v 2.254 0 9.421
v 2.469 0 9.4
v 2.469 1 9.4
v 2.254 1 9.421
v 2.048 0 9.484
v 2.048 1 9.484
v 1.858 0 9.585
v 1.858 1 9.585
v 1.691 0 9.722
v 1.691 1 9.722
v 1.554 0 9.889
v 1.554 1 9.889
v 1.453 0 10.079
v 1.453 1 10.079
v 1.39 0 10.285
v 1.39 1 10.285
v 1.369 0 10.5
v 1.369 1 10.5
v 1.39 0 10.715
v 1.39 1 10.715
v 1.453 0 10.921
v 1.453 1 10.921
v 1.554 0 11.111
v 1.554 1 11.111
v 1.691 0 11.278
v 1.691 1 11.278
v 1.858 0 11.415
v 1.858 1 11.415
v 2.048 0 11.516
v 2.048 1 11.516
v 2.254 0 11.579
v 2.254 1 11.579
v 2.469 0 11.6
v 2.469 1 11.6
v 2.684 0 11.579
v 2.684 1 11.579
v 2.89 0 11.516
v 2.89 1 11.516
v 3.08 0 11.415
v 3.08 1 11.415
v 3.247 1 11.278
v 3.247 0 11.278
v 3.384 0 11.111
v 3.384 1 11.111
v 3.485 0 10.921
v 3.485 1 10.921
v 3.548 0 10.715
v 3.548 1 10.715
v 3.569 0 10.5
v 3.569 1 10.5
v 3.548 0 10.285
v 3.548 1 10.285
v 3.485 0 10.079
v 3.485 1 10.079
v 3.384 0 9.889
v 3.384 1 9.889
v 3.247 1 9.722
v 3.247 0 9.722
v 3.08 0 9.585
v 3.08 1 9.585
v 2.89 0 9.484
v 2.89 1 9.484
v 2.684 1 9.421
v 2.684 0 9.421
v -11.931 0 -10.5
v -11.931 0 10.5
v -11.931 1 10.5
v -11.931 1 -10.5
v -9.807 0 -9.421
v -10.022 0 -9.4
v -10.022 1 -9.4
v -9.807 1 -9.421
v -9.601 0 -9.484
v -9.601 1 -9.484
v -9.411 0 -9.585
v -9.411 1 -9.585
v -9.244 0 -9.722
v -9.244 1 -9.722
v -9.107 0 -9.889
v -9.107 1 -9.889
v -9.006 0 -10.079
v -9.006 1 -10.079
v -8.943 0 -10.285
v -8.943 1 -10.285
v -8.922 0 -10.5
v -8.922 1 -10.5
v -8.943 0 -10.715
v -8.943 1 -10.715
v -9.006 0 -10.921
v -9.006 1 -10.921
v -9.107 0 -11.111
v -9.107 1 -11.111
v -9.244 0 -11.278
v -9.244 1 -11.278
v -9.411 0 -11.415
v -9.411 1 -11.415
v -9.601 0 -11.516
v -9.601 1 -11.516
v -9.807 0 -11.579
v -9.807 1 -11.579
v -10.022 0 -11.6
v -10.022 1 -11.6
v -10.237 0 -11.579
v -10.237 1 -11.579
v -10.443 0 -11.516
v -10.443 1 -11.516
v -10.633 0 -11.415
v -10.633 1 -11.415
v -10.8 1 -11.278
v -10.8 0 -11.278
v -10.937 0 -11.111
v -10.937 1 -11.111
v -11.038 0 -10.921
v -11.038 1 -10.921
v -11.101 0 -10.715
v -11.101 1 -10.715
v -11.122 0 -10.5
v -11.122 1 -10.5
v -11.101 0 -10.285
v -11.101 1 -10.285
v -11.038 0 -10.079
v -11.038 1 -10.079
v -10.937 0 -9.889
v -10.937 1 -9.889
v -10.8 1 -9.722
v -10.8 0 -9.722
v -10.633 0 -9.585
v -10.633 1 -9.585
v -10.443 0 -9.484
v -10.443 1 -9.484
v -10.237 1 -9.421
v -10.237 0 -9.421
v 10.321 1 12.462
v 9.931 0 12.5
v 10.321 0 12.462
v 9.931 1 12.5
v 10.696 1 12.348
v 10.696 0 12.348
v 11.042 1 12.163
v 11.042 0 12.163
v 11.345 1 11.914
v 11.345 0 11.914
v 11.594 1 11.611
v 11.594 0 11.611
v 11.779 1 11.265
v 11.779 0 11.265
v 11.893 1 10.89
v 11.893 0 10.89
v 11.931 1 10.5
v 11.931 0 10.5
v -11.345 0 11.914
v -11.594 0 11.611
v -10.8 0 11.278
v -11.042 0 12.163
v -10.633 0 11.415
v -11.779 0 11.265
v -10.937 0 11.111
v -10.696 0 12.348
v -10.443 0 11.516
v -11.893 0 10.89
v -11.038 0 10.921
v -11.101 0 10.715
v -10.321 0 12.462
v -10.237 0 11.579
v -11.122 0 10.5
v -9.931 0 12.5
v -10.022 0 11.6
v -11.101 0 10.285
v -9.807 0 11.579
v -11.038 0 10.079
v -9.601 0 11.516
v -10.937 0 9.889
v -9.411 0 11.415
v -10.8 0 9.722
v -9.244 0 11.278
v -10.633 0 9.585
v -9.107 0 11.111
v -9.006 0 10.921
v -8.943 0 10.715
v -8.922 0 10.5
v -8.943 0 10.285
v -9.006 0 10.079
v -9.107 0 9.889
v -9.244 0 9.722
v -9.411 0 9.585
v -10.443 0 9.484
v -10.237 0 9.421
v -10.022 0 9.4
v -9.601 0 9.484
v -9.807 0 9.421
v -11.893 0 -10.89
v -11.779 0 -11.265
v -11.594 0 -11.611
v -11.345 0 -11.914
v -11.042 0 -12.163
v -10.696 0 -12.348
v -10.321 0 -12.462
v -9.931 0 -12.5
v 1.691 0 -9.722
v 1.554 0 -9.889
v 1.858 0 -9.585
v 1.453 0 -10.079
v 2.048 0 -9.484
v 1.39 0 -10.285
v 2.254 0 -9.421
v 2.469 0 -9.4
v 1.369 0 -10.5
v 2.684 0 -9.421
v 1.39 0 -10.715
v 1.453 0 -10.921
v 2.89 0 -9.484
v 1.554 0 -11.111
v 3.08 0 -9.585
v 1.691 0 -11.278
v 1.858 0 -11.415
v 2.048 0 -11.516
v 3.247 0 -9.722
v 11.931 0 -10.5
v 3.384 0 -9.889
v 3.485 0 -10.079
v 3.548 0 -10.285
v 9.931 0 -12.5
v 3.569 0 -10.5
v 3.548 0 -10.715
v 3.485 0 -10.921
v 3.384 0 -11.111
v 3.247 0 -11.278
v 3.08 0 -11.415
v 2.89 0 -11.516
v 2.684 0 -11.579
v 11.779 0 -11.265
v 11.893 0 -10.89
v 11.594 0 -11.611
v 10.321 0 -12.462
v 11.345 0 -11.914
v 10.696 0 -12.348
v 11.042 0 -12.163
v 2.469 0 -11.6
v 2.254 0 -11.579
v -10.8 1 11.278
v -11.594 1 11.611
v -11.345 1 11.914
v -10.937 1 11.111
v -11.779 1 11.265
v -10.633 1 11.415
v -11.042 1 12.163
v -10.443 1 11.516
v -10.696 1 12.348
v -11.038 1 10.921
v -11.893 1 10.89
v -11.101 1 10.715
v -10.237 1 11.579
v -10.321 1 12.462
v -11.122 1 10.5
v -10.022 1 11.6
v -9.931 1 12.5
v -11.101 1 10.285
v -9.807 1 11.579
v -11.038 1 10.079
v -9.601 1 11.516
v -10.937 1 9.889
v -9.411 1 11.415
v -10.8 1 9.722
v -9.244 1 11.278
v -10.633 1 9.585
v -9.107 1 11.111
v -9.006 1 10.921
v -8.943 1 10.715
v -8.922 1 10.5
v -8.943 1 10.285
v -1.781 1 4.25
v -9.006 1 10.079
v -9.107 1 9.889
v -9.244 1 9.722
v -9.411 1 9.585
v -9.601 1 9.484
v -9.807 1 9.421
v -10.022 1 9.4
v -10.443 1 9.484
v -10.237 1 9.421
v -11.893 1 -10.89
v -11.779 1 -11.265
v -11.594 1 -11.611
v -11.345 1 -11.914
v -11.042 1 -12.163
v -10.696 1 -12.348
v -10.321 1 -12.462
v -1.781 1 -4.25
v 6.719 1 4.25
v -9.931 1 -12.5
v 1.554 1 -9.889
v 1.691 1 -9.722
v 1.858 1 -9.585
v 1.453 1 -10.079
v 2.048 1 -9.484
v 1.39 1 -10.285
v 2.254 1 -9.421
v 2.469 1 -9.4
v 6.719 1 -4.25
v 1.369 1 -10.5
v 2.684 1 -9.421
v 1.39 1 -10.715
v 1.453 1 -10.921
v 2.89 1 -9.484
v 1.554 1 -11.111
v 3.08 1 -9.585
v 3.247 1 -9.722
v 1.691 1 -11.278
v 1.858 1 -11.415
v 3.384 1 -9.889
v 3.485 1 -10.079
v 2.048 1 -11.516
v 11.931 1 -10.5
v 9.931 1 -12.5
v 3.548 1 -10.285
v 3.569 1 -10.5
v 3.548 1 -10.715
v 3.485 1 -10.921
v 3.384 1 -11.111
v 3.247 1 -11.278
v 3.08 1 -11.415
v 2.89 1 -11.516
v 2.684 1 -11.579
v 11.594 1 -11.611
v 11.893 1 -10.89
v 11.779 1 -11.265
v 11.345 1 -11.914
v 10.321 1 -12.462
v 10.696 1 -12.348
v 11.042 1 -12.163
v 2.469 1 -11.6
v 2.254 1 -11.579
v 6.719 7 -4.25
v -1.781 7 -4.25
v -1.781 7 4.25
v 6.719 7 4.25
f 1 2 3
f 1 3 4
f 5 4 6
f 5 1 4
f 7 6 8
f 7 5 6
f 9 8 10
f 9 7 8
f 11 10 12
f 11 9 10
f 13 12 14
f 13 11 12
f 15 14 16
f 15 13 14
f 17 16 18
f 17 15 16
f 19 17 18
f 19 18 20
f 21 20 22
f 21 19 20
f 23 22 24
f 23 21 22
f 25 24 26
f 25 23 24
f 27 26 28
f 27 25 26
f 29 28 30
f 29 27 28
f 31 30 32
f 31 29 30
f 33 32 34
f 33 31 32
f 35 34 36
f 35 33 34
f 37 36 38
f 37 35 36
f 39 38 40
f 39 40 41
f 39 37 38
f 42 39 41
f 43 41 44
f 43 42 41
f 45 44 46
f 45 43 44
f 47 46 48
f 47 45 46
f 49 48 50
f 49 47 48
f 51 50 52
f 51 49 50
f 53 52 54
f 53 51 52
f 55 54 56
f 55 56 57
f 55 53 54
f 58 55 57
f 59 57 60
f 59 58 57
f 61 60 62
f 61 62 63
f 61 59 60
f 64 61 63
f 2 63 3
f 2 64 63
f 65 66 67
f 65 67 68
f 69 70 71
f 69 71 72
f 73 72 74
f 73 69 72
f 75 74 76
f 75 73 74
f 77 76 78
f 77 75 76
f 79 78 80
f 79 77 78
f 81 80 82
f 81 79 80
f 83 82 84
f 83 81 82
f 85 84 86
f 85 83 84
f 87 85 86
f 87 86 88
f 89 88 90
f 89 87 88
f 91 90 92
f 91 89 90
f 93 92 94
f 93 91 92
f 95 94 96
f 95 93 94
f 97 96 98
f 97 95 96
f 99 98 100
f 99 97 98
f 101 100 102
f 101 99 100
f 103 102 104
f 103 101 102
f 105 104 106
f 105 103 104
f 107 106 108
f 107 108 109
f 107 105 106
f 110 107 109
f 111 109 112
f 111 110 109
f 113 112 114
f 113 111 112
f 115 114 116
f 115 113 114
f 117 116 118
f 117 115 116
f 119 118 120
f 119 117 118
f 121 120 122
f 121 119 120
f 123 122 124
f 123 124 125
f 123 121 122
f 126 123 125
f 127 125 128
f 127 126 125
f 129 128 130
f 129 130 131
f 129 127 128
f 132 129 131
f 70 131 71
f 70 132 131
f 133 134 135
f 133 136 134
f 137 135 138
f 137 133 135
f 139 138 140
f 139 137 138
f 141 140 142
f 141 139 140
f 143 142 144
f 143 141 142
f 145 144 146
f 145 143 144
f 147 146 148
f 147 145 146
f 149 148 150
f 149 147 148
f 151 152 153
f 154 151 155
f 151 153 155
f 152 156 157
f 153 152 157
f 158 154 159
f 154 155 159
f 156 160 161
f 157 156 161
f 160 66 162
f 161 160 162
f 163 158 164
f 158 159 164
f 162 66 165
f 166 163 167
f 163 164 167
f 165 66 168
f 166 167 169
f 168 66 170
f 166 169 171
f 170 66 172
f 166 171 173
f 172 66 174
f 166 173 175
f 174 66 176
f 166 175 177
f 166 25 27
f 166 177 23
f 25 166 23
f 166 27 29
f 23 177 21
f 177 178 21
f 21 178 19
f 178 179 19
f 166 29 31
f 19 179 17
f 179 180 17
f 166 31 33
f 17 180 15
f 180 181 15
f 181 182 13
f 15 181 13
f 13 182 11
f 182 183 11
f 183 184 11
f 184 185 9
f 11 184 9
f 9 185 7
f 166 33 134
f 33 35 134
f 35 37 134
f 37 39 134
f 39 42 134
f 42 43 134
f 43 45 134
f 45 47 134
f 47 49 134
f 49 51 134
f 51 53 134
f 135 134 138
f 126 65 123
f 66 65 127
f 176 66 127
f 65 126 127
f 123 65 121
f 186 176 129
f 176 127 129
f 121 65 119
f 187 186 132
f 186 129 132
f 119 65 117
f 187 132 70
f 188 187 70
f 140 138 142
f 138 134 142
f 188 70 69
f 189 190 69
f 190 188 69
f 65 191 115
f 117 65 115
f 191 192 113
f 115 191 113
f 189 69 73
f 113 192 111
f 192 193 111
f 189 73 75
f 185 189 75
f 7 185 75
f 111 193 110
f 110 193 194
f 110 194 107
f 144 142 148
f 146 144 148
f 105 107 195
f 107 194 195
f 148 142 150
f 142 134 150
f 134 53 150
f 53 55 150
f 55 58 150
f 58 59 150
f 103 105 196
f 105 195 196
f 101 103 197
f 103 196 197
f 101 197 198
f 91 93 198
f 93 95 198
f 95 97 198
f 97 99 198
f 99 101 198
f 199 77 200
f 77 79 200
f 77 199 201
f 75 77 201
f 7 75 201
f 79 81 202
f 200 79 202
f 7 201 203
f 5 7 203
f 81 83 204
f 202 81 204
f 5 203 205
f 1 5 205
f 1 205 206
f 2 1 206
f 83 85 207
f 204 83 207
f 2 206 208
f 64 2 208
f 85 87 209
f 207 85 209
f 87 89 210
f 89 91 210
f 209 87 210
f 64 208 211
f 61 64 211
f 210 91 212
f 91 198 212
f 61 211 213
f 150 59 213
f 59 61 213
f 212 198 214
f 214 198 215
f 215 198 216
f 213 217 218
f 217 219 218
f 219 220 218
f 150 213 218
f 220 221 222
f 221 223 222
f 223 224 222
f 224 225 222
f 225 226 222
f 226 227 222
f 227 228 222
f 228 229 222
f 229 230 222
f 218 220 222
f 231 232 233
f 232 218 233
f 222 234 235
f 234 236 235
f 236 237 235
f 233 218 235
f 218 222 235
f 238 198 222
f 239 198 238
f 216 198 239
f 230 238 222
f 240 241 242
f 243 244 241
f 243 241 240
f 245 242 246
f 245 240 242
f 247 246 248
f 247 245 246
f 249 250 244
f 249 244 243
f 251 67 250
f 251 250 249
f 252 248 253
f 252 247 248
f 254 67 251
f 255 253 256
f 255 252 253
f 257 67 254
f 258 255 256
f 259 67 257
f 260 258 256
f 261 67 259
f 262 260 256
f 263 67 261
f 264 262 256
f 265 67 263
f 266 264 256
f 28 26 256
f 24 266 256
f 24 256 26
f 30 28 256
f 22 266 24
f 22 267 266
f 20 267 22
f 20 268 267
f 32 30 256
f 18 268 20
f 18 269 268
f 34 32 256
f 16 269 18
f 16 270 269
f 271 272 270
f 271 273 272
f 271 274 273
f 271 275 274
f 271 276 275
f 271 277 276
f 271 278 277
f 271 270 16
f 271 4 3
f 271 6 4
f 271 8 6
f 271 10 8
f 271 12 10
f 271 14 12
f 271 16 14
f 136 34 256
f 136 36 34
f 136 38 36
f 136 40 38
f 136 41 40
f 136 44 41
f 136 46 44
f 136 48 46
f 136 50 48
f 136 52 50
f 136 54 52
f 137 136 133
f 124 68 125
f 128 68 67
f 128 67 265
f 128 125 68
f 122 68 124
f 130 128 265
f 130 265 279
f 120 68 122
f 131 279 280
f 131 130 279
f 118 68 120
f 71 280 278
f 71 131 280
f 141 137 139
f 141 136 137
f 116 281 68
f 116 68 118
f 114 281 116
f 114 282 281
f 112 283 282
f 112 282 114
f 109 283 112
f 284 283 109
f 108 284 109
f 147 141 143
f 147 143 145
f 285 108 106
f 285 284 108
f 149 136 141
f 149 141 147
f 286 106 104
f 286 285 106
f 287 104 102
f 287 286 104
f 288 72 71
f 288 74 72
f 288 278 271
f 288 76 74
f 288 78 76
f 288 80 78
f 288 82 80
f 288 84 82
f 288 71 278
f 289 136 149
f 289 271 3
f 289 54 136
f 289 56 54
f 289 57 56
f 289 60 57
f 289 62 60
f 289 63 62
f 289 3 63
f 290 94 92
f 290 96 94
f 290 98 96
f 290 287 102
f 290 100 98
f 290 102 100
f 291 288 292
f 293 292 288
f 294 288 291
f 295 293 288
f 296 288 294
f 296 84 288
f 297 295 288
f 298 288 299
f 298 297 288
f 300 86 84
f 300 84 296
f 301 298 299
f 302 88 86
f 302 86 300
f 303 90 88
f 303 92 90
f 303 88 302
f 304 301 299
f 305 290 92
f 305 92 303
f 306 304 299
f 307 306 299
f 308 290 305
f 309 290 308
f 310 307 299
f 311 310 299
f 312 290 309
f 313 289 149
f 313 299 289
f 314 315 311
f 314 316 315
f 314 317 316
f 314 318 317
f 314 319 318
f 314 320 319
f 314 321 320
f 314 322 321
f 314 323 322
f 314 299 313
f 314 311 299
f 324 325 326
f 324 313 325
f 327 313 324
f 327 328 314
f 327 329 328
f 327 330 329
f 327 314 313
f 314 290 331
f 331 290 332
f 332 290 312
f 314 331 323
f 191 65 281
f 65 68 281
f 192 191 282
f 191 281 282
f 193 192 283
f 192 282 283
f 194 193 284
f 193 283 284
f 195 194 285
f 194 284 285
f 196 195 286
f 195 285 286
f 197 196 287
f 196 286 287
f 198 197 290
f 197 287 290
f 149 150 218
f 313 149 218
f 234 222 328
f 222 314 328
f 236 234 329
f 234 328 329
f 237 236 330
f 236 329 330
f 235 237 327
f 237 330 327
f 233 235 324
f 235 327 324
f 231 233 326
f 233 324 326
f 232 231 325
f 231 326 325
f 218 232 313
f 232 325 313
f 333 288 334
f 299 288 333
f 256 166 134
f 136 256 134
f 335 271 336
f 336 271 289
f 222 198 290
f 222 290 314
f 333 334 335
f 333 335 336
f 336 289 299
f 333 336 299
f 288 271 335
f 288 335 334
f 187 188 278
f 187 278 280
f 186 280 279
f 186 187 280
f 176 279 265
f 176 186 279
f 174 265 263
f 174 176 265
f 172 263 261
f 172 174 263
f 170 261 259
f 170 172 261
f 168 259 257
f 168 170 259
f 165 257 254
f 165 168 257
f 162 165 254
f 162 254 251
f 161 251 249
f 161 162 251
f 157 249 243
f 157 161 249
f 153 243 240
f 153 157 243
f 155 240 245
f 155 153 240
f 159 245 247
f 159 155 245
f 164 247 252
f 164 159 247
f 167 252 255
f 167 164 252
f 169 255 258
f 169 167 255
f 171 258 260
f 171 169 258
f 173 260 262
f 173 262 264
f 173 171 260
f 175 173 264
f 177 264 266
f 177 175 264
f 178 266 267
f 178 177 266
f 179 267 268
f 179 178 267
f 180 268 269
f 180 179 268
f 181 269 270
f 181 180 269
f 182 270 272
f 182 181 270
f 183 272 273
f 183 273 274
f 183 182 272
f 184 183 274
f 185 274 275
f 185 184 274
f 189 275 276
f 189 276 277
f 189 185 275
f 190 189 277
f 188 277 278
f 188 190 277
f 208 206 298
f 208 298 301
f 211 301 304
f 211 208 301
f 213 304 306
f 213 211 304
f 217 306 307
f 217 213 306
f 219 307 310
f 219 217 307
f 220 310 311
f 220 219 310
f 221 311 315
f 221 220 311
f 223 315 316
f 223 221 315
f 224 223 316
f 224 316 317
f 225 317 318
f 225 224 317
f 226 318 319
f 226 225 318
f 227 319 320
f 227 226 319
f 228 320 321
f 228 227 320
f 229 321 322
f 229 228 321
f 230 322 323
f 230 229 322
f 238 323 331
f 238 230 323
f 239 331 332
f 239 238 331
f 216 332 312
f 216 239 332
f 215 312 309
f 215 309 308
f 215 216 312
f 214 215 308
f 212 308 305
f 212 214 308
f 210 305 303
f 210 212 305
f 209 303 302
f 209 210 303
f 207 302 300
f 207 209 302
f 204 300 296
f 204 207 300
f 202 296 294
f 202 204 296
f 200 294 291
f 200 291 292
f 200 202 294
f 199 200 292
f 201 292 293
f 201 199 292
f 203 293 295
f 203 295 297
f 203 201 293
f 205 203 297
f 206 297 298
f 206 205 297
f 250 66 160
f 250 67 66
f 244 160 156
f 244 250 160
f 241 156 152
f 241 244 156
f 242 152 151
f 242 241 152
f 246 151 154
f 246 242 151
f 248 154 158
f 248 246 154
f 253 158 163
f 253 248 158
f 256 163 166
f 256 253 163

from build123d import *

# Parameters (mm, degrees)
SKETCH1_W           = 23.862
SKETCH1_H           = 25
SKETCH1_R           = 1.1
BOSS_EXTRUDE1_DEPTH = 1
FILLET1_R           = 2
SKETCH2_W           = 8.5
SKETCH2_H           = 8.5
BOSS_EXTRUDE2_DEPTH = 6


with BuildPart() as part:
    # Sketch1 → Boss-Extrude1 (new body)
    with BuildSketch(Plane(origin=(0, 0, 0), x_dir=(1, 0, 0), z_dir=(0, 1, 0))):
        Rectangle(SKETCH1_W, SKETCH1_H)
        with Locations(Location((-10.02204, 10.5, 0), (0, 0, 270))):
            Circle(SKETCH1_R, mode=Mode.SUBTRACT)
        with Locations(Location((2.469, 10.5, 0), (0, 0, 270))):
            Circle(SKETCH1_R, mode=Mode.SUBTRACT)
        with Locations(Location((2.469, -10.5, 0), (0, 0, 90))):
            Circle(SKETCH1_R, mode=Mode.SUBTRACT)
        with Locations(Location((-10.02204, -10.5, 0), (0, 0, 90))):
            Circle(SKETCH1_R, mode=Mode.SUBTRACT)
    extrude(amount=BOSS_EXTRUDE1_DEPTH)

    # Fillet1
    fillet1_edges = [part.edges().sort_by_distance(p)[0] for p in [
        (11.931, 0.5, 12.5),
        (-11.931, 0.5, 12.5),
        (-11.931, 0.5, -12.5),
        (11.931, 0.5, -12.5),
    ]]
    fillet(fillet1_edges, radius=FILLET1_R)

    # Sketch2 → Boss-Extrude2 (add)
    with BuildSketch(Plane(origin=(0, 1, 0), x_dir=(1, 0, 0), z_dir=(0, 1, 0))):
        with Locations((2.469, 0)):
            Rectangle(SKETCH2_W, SKETCH2_H)
    extrude(amount=BOSS_EXTRUDE2_DEPTH)


solid = part.part
